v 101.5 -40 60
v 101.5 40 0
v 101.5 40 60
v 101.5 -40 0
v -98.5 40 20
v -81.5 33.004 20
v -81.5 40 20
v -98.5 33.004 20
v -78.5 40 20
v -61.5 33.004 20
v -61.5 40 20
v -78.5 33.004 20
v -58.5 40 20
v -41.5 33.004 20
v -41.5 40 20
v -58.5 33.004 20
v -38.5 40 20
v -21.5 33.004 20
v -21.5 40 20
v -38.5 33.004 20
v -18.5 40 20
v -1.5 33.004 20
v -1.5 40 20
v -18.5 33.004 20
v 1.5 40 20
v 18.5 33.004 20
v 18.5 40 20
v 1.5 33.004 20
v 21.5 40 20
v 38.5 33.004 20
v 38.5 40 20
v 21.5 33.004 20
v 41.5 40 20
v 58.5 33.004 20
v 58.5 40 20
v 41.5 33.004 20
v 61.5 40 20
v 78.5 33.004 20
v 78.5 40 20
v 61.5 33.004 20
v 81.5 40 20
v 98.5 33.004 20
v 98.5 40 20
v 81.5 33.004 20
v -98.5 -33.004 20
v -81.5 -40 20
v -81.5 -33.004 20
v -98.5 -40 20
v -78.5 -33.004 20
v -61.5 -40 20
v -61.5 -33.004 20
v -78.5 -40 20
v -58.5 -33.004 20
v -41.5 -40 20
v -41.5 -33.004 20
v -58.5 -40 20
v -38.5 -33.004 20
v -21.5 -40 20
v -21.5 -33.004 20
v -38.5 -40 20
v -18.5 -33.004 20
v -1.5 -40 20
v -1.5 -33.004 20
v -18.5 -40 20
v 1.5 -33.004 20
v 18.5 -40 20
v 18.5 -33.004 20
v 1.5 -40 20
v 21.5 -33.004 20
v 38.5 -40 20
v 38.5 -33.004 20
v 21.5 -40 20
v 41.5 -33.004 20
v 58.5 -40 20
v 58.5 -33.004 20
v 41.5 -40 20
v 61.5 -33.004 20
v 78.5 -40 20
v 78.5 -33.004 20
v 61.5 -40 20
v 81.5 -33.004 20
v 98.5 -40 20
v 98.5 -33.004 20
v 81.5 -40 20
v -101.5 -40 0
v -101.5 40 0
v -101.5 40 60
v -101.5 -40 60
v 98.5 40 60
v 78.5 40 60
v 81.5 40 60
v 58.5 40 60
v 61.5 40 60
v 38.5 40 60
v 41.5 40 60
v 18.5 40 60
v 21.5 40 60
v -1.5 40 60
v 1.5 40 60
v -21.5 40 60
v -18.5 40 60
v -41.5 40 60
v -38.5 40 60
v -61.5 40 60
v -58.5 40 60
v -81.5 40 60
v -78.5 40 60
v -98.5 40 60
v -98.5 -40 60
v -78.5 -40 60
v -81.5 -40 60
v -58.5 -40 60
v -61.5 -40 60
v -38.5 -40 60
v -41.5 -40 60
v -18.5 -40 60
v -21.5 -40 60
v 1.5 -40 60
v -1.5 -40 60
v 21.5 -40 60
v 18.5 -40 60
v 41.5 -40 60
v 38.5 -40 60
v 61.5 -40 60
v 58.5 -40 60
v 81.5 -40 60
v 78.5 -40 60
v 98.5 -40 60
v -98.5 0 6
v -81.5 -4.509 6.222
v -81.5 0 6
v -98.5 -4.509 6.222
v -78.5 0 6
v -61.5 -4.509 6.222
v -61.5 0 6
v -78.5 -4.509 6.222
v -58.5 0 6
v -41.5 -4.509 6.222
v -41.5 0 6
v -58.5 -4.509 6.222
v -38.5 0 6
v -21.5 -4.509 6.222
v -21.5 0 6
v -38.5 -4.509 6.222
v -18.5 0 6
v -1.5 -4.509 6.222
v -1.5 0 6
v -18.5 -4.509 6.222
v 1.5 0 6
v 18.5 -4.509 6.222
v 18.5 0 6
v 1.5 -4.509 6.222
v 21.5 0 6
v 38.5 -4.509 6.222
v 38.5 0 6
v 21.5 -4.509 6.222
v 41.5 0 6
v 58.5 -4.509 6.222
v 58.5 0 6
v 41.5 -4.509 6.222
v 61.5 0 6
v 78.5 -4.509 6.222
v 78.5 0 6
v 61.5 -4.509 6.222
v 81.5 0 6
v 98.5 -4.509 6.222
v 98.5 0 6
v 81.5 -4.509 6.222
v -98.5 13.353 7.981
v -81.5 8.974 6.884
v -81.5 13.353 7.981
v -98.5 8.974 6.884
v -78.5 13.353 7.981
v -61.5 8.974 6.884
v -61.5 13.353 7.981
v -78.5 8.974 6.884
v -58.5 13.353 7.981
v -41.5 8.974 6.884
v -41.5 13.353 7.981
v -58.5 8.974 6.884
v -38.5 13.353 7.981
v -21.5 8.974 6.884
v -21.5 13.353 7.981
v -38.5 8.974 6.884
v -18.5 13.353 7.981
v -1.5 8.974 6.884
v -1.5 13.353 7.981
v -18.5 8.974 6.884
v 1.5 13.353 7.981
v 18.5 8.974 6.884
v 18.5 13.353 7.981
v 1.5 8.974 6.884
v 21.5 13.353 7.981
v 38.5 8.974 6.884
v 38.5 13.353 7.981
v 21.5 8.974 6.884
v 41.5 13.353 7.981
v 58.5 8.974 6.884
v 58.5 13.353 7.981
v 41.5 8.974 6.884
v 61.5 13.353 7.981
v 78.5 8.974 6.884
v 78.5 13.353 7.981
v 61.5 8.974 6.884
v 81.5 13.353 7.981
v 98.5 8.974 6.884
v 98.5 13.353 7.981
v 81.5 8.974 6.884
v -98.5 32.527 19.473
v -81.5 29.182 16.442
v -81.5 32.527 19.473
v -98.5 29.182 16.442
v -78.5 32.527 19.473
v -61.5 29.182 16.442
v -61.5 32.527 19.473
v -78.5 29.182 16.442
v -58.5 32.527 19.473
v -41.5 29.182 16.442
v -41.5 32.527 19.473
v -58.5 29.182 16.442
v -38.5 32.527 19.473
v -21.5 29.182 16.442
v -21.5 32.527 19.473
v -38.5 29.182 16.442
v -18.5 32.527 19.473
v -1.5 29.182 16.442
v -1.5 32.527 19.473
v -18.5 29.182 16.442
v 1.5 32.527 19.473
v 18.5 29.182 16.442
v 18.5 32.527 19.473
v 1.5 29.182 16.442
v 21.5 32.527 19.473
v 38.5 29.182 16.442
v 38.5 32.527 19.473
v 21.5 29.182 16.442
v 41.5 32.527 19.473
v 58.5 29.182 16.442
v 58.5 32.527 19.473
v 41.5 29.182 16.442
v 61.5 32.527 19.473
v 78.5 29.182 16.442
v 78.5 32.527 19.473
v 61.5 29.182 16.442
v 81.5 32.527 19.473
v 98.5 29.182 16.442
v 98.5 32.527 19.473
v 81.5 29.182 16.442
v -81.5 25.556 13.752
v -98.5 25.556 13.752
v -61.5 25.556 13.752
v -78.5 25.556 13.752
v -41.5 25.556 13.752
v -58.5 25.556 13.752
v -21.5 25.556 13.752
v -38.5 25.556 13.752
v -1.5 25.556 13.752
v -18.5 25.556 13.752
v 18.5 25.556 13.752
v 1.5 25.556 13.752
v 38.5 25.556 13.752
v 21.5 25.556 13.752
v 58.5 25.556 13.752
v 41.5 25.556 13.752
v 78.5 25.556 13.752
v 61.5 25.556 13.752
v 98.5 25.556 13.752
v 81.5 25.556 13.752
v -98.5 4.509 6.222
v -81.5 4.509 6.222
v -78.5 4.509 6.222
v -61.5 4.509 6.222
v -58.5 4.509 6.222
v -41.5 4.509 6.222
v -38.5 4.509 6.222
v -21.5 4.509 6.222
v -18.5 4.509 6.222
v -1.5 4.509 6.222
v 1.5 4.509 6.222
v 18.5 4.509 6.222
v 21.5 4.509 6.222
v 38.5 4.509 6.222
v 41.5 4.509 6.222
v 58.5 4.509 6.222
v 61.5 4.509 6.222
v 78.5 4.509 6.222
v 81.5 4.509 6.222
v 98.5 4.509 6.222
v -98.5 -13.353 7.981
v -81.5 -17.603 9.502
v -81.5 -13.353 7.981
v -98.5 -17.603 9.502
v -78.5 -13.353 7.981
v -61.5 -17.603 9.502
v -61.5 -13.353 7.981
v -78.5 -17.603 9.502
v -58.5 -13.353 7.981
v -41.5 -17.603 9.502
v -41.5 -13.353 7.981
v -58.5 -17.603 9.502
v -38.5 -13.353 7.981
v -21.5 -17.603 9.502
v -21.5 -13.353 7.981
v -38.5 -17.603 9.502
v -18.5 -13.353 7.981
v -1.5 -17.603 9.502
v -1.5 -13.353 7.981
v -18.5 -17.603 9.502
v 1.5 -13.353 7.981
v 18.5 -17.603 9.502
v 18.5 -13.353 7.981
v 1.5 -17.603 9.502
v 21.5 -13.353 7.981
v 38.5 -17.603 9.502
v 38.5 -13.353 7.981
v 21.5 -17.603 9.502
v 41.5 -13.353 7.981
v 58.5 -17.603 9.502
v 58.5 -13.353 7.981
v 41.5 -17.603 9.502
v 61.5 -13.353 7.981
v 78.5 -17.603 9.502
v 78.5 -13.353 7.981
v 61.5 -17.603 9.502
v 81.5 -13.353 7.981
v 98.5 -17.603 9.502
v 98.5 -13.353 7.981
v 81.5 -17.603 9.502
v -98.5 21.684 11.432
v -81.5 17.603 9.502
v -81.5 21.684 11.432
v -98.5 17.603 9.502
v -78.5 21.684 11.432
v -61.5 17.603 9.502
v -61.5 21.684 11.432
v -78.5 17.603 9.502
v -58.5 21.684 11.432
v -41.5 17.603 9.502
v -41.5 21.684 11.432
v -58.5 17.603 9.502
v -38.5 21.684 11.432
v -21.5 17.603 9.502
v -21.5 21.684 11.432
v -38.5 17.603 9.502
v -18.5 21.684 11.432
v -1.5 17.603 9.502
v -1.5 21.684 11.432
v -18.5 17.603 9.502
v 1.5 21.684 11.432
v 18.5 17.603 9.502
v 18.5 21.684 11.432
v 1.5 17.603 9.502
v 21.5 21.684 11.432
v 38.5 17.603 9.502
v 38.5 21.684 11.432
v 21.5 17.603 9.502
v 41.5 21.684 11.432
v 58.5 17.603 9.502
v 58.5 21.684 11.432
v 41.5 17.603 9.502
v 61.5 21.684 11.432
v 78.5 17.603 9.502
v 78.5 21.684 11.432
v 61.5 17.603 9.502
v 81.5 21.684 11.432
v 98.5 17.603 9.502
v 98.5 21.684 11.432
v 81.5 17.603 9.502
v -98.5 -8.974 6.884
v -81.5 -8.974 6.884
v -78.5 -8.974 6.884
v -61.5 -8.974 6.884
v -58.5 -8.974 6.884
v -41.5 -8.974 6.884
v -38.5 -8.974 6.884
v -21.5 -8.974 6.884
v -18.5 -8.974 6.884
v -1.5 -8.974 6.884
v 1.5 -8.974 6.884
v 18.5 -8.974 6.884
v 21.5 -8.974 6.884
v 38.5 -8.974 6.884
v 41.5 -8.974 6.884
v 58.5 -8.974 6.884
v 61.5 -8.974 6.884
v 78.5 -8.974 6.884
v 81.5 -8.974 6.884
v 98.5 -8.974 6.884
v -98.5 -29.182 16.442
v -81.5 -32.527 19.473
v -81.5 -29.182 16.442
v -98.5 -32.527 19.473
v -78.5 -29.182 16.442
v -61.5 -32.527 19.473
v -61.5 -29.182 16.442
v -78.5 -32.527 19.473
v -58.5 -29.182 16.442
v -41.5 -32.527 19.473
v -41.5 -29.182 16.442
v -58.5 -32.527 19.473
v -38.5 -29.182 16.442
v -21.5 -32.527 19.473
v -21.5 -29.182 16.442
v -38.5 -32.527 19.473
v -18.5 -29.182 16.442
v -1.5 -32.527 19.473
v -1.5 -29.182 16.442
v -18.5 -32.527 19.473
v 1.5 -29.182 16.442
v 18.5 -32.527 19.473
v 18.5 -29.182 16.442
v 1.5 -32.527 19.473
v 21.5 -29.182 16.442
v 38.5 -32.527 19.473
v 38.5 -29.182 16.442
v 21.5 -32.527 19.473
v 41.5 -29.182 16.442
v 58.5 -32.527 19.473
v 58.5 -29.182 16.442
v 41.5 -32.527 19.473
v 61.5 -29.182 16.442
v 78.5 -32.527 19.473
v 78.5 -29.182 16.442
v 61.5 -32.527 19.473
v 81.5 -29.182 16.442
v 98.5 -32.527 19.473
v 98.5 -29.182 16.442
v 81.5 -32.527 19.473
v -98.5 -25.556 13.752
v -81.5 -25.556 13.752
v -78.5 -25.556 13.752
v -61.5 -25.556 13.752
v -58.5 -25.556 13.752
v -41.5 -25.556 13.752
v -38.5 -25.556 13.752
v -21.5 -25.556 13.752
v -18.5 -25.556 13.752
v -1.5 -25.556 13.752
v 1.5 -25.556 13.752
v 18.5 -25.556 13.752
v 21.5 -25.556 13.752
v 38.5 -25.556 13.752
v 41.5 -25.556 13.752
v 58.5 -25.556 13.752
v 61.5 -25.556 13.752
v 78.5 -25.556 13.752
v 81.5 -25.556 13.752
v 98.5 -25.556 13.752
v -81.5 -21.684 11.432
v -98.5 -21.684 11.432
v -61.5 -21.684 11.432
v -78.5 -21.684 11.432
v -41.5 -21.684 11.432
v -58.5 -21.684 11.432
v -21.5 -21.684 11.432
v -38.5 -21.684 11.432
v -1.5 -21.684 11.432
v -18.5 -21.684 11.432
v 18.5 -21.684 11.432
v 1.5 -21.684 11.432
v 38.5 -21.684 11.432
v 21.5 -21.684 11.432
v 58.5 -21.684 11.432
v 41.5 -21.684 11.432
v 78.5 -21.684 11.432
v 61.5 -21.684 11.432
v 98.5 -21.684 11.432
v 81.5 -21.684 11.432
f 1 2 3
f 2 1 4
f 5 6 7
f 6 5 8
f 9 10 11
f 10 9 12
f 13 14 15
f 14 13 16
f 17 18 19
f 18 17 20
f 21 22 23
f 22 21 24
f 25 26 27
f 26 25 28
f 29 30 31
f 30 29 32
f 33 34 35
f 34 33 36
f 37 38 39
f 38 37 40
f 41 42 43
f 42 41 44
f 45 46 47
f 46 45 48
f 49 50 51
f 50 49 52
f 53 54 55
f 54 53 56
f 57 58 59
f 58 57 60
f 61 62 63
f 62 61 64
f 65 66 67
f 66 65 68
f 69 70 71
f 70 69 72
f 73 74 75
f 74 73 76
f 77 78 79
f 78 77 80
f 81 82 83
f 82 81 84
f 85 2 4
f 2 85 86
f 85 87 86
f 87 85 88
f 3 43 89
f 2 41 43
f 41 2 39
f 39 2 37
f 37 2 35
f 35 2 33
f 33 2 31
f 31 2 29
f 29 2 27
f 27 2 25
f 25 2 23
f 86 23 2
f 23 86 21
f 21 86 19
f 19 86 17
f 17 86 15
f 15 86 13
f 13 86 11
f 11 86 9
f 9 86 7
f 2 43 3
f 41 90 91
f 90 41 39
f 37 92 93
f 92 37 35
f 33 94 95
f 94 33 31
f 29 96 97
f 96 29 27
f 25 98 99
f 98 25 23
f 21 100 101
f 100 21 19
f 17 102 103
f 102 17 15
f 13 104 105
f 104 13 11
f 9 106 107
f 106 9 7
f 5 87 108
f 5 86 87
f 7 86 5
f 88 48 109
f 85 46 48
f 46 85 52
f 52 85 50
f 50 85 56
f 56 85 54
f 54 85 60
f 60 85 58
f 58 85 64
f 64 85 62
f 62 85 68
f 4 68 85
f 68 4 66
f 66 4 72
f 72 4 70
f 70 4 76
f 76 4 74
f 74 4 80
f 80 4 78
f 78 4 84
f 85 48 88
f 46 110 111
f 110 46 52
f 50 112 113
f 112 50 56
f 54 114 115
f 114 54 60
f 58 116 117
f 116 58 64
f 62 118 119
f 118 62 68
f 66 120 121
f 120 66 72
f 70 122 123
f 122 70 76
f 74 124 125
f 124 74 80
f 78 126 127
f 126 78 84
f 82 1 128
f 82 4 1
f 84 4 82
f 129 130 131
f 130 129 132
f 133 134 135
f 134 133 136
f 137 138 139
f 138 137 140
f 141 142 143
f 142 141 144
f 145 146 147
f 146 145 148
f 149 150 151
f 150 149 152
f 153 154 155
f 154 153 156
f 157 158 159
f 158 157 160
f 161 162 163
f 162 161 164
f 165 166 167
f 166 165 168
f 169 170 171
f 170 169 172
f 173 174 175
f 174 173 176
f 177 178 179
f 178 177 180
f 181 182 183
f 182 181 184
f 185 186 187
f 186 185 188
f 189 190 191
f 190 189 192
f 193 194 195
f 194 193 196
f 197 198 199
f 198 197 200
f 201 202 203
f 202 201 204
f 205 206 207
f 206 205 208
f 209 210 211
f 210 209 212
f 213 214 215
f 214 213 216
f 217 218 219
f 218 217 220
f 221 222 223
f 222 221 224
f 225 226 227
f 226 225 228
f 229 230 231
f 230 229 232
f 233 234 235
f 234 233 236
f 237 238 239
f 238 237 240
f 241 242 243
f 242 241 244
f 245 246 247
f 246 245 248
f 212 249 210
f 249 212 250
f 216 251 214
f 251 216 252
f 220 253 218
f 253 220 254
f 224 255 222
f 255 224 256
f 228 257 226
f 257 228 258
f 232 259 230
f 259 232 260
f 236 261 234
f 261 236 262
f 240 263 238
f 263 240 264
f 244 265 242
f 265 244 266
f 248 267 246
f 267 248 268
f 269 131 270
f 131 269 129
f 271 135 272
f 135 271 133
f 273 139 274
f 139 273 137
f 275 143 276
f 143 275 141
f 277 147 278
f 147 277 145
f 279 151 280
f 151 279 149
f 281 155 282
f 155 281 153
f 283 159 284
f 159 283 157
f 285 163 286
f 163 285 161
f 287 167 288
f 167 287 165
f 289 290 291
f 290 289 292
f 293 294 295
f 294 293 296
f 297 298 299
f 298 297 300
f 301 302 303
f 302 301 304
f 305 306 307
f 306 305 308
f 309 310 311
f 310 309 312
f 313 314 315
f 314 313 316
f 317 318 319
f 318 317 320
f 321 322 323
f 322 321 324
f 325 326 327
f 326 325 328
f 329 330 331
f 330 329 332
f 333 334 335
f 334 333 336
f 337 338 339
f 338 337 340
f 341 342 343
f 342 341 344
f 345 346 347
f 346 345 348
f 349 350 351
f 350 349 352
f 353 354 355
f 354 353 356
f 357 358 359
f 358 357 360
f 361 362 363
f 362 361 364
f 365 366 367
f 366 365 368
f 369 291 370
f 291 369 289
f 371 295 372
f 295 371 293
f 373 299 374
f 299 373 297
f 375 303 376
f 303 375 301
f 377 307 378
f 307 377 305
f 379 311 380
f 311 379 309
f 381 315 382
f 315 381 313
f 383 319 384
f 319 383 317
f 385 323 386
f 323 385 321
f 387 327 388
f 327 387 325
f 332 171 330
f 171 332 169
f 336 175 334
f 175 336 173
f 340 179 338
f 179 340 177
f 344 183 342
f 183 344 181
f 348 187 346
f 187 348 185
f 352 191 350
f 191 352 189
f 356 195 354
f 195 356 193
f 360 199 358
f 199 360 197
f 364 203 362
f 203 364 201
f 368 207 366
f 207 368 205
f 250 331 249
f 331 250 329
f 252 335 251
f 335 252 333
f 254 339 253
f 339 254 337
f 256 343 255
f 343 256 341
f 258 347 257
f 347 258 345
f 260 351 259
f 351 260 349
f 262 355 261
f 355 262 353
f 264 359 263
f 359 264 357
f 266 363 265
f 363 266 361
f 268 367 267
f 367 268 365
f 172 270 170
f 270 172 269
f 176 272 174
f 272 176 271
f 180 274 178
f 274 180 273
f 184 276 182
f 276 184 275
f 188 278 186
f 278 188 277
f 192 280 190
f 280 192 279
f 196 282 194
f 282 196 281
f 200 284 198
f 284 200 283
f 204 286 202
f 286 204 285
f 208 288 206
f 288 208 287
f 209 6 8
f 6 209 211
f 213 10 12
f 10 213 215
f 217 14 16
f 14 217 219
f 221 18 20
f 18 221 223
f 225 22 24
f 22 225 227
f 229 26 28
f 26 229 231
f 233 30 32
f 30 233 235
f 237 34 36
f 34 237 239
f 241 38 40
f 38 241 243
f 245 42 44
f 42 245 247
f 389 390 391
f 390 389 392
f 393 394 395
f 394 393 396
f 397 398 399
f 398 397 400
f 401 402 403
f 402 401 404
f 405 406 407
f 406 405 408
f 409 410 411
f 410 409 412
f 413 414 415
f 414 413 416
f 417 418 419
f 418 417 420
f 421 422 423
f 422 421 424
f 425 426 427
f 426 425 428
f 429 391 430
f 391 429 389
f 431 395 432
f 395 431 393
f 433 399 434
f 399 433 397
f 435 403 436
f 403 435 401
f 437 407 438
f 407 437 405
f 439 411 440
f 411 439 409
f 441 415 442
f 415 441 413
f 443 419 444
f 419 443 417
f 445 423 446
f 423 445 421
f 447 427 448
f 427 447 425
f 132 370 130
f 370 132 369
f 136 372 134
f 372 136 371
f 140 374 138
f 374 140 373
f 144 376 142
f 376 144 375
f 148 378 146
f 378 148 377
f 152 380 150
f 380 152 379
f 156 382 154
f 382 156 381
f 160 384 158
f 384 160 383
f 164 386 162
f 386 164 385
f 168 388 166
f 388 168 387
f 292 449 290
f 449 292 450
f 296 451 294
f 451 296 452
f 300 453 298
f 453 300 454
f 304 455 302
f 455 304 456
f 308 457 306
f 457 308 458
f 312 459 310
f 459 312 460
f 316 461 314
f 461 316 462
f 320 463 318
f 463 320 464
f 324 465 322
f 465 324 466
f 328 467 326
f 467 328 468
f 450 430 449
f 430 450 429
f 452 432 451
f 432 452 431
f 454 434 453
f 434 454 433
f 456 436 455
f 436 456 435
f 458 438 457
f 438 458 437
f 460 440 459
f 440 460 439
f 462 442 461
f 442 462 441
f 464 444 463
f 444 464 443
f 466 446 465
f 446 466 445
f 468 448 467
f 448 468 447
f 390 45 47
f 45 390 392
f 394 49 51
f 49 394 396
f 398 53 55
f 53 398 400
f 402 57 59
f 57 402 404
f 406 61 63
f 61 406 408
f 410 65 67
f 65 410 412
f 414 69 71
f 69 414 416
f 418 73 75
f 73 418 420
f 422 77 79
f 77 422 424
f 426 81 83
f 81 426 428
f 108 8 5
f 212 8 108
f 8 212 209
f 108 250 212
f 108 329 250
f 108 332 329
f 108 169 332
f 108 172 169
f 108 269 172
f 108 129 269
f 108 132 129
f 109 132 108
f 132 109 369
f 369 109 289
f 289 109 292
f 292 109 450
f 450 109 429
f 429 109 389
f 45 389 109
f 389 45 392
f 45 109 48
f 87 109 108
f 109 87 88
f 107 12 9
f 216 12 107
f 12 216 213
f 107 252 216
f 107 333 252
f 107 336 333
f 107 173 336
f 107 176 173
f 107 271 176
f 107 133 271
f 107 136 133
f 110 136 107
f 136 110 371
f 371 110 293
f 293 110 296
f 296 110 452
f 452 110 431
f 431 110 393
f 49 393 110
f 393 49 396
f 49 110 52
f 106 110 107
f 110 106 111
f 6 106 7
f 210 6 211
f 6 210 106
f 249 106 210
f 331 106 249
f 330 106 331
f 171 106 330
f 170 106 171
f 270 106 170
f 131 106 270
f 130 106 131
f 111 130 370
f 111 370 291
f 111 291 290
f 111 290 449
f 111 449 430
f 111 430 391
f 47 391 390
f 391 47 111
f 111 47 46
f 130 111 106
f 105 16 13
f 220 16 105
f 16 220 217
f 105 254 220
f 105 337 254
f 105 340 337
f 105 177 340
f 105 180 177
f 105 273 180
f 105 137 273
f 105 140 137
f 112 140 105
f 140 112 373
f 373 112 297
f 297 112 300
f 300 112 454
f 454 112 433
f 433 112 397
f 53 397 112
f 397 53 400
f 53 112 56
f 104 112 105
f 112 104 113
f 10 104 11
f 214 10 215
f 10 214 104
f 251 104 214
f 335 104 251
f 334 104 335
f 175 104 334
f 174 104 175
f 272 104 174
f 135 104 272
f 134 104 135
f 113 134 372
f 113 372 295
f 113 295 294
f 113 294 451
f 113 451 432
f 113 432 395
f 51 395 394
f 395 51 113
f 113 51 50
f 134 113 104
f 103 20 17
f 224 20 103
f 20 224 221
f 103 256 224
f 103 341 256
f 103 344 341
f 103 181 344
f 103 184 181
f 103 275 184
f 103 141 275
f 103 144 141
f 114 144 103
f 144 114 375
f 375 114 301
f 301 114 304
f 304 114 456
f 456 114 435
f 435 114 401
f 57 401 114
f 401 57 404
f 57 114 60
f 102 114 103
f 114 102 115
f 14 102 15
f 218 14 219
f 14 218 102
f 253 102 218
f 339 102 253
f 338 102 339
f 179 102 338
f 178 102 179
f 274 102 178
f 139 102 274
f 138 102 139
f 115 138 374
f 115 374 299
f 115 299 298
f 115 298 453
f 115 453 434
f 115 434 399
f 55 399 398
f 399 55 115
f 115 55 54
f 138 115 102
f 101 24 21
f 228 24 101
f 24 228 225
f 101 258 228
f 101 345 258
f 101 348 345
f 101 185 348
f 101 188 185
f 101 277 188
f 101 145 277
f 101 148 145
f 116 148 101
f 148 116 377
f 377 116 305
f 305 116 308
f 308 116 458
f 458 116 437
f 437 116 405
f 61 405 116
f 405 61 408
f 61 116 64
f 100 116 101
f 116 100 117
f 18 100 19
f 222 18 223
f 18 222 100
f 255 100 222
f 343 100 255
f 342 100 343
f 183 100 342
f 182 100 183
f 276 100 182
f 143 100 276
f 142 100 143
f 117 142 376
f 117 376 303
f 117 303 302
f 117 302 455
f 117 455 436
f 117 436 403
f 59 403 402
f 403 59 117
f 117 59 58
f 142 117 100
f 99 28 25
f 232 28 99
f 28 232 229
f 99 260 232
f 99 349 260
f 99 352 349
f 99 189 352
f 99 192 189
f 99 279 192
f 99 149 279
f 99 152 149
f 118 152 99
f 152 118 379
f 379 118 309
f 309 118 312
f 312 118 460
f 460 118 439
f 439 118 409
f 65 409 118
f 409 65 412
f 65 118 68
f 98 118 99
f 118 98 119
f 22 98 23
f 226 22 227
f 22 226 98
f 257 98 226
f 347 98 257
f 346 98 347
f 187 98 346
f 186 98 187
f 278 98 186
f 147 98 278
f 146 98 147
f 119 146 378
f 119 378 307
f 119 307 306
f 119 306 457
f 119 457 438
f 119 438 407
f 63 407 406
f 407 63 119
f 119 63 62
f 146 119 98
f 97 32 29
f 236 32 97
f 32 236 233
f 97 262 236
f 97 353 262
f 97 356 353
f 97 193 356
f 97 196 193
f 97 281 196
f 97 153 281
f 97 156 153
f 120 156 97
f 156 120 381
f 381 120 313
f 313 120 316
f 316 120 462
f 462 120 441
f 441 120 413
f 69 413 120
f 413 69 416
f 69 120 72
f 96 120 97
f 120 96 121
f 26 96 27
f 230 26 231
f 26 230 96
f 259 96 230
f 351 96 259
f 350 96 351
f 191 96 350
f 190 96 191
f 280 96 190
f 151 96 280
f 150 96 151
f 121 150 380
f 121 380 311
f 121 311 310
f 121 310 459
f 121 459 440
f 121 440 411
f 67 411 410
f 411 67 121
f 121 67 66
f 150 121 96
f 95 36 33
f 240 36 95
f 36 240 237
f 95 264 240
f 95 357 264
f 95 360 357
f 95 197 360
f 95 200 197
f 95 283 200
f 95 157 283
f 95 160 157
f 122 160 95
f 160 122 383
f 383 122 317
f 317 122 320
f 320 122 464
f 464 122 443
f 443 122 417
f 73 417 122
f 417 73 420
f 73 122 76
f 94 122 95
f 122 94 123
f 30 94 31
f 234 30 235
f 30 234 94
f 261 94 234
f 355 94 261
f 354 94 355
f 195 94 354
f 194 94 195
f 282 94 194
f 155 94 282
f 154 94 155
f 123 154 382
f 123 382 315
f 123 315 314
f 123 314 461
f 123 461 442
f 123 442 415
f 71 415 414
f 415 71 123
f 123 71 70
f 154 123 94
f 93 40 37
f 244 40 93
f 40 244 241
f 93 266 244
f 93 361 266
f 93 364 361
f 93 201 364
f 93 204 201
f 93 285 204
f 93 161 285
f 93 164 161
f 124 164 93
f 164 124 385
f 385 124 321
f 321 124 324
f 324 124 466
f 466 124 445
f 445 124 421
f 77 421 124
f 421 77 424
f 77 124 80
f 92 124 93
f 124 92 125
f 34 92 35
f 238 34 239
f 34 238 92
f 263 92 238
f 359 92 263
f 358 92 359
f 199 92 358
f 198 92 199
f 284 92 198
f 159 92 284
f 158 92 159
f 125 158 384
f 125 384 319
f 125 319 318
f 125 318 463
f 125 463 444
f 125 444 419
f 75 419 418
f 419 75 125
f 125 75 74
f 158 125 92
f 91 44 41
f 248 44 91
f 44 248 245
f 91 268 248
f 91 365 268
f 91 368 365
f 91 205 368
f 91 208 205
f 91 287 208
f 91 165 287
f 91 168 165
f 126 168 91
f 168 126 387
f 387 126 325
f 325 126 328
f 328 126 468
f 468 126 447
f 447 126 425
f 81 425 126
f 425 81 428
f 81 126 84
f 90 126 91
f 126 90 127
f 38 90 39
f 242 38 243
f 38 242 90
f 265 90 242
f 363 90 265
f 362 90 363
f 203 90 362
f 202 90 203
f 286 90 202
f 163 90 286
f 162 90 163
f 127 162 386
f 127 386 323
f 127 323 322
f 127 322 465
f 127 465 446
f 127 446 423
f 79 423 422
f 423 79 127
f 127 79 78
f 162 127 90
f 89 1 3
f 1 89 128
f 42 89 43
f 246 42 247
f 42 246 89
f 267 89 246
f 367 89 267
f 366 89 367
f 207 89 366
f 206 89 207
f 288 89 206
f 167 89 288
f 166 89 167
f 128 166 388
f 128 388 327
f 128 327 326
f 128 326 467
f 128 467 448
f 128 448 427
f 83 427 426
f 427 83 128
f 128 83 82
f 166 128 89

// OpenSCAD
// --- Dimensions ---
base_length = 203;          // X dimension of the base
base_width = 80;            // Y dimension of the base
base_height = 20;           // Z dimension of the base

dish_radius = 46;           // Radius of the cylinder used to cut the cradle
cradle_z_center = 52;       // Z coordinate of the cylinder axis
cradle_offset = 2;          // Extra length for cutting operations

divider_thickness = 3;       // Thickness of each divider plate
divider_height = 60;        // Height of each divider plate
divider_count = 11;          // Number of divider plates
divider_spacing_x = 20;      // Distance between divider centers

// --- Parameters ---
$fn = 64;

// --- Corrected Assembly Logic ---
// The previous report showed the part was centered at Z=0 (ranging from -10 to 60).
// The instructions state: "it rests on the XY plane at z = 0 and builds upward (+Z)".
// Therefore, the base must be translated so its bottom is at Z=0.
// Base Z range: 0 to 20.
// Divider Z range: 0 to 60.

// We must also ensure the cradle is cut correctly. 
// The cradle axis is at Z = 52. 
// The base is at Z = [0, 20]. 
// The cradle bottom is at 52 - 46 = 6.
// Since 6 is within the [0, 20] range, the cradle will cut into the top of the base.

module base_with_groove() {
    difference() {
        // The base block: translated so bottom is at Z=0
        // Center is at [0, 0, base_height/2]
        translate([0, 0, base_height / 2])
            cube([base_length, base_width, base_height], center = true);
        
        // The cradle cylinder
        // Axis runs along X, at Y=0, Z=52.
        // We translate the cylinder so its axis is at Z=52.
        // Note: The cylinder is subtracted from the base.
        translate([0, 0, cradle_z_center])
            rotate([0, 90, 0])
                cylinder(h = base_length + cradle_offset * 2, r = dish_radius, center = true);
    }
}

module dividers() {
    for (i = [0 : divider_count - 1]) {
        x_pos = -100 + (i * divider_spacing_x);
        // Dividers rise from Z=0 to Z=60.
        // Center is at [x_pos, 0, divider_height/2]
        translate([x_pos, 0, divider_height / 2])
            cube([divider_thickness, base_width, divider_height], center = true);
    }
}

// Final Render
// The union ensures the part is a single solid.
// The dividers are added to the base_with_groove.
// Because the cradle is only subtracted from the base, the dividers remain solid.
union() {
    base_with_groove();
    dividers();
}

// Verification of requirements:
// 1. Base: 203x80x20, centered on XY, bottom at Z=0.
// 2. Cradle: Radius 46, Axis X, Y=0, Z=52. Bottom at Z=6.
// 3. Dividers: 11 plates, 3mm thick, 80mm wide, Z=0 to 60, X = -100 to 100.
// 4. Cradle not cut through dividers: Handled by subtracting cradle only from base.
